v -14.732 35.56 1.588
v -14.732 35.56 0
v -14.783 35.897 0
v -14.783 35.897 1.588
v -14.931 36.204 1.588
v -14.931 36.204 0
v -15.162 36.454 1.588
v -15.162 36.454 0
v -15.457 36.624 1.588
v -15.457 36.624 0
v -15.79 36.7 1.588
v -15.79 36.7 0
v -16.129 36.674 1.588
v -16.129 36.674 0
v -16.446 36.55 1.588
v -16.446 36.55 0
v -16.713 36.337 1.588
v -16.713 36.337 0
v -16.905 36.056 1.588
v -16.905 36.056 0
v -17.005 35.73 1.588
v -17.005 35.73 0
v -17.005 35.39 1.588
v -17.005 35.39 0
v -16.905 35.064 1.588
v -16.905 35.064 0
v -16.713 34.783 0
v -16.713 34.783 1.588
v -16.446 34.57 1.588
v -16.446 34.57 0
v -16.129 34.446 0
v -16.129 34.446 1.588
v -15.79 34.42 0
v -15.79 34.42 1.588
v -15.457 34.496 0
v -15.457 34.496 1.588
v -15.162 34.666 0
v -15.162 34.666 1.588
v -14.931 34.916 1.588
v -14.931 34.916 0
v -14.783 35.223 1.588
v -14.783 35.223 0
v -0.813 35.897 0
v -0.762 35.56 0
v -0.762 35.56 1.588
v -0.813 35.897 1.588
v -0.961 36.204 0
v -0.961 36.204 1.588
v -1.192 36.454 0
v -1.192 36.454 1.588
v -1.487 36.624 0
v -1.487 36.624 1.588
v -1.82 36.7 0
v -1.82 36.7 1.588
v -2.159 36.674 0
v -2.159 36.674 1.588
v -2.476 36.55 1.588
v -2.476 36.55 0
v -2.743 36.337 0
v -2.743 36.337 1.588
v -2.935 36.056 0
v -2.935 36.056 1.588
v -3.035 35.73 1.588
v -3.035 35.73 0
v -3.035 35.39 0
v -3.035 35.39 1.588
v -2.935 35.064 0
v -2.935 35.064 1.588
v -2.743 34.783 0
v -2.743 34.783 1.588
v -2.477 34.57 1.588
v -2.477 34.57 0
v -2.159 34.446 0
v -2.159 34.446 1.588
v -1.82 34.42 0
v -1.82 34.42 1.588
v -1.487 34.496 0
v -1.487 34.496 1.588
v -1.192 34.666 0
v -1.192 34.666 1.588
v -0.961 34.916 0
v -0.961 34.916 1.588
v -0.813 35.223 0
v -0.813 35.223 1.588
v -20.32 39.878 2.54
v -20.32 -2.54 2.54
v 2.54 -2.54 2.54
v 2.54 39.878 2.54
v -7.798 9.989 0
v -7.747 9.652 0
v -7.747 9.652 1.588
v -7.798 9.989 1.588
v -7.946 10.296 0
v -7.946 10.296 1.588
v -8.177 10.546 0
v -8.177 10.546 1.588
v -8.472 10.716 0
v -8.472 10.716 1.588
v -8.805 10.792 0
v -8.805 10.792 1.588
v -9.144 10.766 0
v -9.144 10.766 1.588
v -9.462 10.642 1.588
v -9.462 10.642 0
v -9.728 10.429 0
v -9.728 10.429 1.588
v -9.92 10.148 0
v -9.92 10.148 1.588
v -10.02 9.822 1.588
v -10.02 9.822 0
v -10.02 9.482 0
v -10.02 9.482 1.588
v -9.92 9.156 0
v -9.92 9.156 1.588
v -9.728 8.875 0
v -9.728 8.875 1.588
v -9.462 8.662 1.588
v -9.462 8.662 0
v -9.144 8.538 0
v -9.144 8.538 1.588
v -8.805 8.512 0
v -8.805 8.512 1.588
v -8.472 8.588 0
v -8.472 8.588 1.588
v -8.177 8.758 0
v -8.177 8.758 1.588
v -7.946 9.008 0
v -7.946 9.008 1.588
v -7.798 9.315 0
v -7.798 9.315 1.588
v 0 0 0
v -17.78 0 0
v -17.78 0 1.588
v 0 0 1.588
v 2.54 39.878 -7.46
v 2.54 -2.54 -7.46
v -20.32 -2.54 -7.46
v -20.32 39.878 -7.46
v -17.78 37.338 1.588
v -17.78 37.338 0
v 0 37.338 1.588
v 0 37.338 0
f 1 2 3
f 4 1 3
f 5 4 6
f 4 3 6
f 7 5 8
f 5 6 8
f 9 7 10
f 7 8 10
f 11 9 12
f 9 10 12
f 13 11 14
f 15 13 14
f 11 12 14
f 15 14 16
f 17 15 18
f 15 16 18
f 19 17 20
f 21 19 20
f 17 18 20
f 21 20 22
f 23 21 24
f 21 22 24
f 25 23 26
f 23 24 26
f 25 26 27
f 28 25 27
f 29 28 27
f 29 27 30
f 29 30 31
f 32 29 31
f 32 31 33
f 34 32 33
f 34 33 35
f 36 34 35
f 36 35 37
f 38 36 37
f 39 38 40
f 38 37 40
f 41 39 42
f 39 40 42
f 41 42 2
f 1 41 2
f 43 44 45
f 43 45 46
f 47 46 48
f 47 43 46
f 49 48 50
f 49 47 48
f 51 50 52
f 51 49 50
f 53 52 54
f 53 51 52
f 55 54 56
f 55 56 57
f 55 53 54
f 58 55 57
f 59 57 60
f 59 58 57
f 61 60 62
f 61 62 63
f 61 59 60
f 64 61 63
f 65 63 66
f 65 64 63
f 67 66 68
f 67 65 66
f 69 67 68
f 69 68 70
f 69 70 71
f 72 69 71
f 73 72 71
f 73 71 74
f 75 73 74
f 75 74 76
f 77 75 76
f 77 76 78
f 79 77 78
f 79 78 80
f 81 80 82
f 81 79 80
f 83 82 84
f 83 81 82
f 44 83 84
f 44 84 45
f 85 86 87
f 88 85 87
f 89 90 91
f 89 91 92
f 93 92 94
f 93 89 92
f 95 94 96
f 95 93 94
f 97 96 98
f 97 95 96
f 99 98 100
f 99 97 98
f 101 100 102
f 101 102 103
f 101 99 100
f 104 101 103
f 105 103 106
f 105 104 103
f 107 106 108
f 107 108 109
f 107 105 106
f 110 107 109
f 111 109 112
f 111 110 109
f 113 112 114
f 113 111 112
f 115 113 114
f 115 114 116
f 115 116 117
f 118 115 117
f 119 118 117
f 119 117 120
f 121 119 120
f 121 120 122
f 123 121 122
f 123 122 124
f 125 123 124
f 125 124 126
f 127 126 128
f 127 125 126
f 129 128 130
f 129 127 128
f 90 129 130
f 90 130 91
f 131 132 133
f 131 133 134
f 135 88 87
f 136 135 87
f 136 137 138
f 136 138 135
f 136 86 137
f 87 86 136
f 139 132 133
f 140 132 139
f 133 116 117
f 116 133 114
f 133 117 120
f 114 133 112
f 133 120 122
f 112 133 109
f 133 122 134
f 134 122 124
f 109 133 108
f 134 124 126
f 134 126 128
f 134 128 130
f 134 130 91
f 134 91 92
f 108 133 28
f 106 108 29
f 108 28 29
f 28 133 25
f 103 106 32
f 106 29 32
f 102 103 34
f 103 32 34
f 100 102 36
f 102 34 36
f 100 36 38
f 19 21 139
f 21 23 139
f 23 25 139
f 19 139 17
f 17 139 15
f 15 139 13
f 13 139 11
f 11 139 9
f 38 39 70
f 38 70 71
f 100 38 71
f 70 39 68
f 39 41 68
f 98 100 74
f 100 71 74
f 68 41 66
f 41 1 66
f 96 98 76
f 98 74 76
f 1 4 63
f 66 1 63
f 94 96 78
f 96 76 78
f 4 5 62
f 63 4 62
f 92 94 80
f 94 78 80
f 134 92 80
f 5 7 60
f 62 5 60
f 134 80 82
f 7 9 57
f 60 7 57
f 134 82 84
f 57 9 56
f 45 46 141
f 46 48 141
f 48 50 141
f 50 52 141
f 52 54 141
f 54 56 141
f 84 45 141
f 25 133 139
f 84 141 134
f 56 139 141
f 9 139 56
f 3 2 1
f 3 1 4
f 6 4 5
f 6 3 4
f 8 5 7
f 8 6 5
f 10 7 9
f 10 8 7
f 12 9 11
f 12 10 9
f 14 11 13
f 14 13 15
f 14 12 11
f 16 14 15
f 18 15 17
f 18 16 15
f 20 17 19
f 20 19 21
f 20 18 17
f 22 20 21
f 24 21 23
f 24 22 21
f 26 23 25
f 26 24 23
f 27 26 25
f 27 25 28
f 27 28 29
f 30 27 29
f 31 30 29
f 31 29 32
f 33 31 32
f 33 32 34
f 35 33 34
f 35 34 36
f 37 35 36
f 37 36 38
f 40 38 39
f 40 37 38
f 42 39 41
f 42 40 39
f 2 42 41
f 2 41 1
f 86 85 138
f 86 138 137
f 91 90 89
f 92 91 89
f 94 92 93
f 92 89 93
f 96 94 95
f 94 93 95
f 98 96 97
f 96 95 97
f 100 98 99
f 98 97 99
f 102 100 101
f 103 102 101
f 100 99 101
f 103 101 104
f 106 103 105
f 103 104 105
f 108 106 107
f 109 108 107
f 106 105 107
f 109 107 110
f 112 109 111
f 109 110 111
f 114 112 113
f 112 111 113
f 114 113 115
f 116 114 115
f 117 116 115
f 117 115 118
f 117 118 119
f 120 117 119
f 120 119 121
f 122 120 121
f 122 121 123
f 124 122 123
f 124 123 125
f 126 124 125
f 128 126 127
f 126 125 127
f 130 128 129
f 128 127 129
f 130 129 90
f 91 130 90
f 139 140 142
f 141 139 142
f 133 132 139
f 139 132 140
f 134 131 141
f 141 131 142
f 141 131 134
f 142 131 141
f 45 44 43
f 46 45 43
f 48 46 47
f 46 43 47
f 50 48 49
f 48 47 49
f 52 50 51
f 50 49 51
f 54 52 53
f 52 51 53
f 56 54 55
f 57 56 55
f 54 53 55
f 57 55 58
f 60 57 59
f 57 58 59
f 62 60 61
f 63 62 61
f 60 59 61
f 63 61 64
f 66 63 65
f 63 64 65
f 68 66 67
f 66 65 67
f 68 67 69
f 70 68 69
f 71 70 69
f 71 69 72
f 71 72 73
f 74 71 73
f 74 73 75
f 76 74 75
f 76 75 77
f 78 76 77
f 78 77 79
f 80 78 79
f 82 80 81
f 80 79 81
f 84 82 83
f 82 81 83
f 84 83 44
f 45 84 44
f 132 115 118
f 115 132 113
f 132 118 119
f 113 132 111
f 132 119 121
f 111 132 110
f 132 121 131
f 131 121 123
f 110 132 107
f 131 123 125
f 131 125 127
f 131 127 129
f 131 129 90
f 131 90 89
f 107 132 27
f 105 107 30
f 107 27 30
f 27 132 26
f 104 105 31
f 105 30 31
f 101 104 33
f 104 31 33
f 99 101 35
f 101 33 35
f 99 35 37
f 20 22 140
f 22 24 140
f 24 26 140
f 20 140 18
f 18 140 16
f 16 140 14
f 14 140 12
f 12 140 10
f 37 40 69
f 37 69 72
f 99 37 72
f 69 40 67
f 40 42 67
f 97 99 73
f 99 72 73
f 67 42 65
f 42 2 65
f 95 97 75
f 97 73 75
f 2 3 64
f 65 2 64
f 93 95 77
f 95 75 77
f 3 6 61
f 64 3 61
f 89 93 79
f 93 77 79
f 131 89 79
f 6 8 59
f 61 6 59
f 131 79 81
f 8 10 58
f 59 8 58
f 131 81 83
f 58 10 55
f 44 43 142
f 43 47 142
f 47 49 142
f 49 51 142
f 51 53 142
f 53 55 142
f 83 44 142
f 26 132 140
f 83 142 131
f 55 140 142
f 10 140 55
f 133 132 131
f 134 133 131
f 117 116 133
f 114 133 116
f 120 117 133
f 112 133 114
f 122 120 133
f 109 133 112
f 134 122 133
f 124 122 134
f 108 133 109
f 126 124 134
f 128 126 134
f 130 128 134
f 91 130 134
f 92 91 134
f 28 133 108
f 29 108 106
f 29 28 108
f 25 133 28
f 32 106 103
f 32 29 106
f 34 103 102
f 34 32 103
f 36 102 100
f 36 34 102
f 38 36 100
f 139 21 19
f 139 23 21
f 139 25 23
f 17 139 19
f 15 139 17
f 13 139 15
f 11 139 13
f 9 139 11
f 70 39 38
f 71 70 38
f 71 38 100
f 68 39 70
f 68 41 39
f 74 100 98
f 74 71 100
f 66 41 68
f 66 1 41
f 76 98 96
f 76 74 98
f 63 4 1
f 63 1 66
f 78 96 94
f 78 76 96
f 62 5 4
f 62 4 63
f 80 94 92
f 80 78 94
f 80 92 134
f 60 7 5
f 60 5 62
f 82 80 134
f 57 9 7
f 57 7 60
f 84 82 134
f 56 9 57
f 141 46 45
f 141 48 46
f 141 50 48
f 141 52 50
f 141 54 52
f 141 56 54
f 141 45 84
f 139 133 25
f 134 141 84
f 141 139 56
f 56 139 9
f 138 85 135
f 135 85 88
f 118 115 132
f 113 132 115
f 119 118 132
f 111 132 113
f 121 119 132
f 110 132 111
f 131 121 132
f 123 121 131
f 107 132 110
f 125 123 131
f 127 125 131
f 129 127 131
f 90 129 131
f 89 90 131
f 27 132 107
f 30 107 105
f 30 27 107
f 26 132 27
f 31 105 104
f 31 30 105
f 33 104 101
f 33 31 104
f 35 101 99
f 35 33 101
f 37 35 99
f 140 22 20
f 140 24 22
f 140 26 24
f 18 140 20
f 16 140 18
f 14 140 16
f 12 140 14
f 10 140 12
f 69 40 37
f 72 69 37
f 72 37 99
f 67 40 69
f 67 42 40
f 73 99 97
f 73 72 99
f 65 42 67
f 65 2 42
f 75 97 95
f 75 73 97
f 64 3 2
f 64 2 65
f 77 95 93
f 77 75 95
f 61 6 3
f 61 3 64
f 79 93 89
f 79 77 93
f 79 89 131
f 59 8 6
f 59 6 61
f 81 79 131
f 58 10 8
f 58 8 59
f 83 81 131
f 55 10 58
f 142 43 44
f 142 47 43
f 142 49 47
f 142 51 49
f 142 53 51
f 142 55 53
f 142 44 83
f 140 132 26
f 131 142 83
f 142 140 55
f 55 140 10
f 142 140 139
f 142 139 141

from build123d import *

# Parameters (mm, degrees)
F0_W     = 17.78
F0_H     = 37.338
F0_R     = 1.143
F1_DEPTH = 1.5875
F3_W     = 22.86
F3_H     = 42.418
F3_W_2   = 17.78
F3_H_2   = 37.338
F4_DEPTH = 10


# Not quite as in the source:
# - a feature names something its author has since deleted; it is built from what else it names


with BuildPart() as f1:
    # F0 (on Top) → F1 (new body)
    with BuildSketch(Plane.XY):
        with Locations((-8.89, 18.669)):
            Rectangle(F0_W, F0_H)
        with Locations((-8.89, 9.652)):
            Circle(F0_R, mode=Mode.SUBTRACT)
        with Locations((-15.875, 35.56)):
            Circle(F0_R, mode=Mode.SUBTRACT)
        with Locations((-1.905, 35.56)):
            Circle(F0_R, mode=Mode.SUBTRACT)
    extrude(amount=F1_DEPTH)


with BuildPart() as f4:
    # F3 (on offset) → F4 (new body)
    with BuildSketch(Plane(origin=(0, 0, 2.54), x_dir=(1, 0, 0), z_dir=(0, 0, -1))):
        with Locations((-8.89, -18.669)):
            Rectangle(F3_W, F3_H)
        with Locations((-8.89, -18.669)):
            Rectangle(F3_W_2, F3_H_2, mode=Mode.SUBTRACT)
        with Locations((-8.89, -18.669)):
            Rectangle(F3_W_2, F3_H_2)
    extrude(amount=F4_DEPTH)

    # F5: cut F1
    add(f1.part, mode=Mode.SUBTRACT)


solid = Compound([f1.part, f4.part])
